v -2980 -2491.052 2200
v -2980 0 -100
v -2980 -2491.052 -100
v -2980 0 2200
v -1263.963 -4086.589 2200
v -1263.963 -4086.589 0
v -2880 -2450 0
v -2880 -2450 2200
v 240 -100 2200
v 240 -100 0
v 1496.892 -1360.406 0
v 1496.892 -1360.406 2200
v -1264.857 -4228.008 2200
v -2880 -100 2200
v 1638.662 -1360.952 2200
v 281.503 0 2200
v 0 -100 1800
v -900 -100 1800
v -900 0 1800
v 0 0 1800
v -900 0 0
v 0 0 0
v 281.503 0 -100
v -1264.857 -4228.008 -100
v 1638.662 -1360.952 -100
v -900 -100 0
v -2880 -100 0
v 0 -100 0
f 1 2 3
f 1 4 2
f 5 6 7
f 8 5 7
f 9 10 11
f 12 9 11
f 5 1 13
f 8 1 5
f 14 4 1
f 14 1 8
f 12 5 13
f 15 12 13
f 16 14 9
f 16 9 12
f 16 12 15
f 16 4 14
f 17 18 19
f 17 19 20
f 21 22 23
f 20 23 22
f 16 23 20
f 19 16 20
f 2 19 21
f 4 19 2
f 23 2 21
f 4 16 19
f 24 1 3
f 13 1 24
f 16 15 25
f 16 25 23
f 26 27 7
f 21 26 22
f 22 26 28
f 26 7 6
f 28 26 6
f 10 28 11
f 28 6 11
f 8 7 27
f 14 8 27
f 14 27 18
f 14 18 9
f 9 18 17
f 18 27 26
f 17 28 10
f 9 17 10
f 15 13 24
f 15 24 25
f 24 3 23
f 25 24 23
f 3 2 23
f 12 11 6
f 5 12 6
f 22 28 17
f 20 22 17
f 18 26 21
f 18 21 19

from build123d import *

# Parameters (mm, degrees)
F1_DEPTH = 2200
F3_DEPTH = 100
F4_W     = 900
F4_H     = 1800
F5_DEPTH = 100


with BuildPart() as f1:
    # F0 (on Top) → F1 (new body)
    with BuildSketch(Plane.XY):
        Polygon((281.503142, 0), (0, 0), (-2980, 0), (-2980, -2491.051698), (-1264.856789, -4228.007989), (1638.661755, -1360.952471), align=None)
        Polygon((-2880, -2450), (-2880, -100), (0, -100), (240, -100), (1496.89206, -1360.405629), (-1263.963195, -4086.589456), align=None, mode=Mode.SUBTRACT)
    extrude(amount=F1_DEPTH)

    # F2 (on Top) → F3 (join)
    with BuildSketch(Plane.XY):
        Polygon((-2980, -2491.051698), (-1264.856789, -4228.007989), (1638.661755, -1360.952471), (281.503142, 0), (-2980, 0), align=None)
    extrude(amount=-F3_DEPTH)

    # F4 (on face) → F5 (cut, through all)
    with BuildSketch(Plane.XZ.offset(100)):
        with Locations((-450, 900)):
            Rectangle(F4_W, F4_H)
    extrude(amount=-F5_DEPTH, mode=Mode.SUBTRACT)


solid = f1.part
